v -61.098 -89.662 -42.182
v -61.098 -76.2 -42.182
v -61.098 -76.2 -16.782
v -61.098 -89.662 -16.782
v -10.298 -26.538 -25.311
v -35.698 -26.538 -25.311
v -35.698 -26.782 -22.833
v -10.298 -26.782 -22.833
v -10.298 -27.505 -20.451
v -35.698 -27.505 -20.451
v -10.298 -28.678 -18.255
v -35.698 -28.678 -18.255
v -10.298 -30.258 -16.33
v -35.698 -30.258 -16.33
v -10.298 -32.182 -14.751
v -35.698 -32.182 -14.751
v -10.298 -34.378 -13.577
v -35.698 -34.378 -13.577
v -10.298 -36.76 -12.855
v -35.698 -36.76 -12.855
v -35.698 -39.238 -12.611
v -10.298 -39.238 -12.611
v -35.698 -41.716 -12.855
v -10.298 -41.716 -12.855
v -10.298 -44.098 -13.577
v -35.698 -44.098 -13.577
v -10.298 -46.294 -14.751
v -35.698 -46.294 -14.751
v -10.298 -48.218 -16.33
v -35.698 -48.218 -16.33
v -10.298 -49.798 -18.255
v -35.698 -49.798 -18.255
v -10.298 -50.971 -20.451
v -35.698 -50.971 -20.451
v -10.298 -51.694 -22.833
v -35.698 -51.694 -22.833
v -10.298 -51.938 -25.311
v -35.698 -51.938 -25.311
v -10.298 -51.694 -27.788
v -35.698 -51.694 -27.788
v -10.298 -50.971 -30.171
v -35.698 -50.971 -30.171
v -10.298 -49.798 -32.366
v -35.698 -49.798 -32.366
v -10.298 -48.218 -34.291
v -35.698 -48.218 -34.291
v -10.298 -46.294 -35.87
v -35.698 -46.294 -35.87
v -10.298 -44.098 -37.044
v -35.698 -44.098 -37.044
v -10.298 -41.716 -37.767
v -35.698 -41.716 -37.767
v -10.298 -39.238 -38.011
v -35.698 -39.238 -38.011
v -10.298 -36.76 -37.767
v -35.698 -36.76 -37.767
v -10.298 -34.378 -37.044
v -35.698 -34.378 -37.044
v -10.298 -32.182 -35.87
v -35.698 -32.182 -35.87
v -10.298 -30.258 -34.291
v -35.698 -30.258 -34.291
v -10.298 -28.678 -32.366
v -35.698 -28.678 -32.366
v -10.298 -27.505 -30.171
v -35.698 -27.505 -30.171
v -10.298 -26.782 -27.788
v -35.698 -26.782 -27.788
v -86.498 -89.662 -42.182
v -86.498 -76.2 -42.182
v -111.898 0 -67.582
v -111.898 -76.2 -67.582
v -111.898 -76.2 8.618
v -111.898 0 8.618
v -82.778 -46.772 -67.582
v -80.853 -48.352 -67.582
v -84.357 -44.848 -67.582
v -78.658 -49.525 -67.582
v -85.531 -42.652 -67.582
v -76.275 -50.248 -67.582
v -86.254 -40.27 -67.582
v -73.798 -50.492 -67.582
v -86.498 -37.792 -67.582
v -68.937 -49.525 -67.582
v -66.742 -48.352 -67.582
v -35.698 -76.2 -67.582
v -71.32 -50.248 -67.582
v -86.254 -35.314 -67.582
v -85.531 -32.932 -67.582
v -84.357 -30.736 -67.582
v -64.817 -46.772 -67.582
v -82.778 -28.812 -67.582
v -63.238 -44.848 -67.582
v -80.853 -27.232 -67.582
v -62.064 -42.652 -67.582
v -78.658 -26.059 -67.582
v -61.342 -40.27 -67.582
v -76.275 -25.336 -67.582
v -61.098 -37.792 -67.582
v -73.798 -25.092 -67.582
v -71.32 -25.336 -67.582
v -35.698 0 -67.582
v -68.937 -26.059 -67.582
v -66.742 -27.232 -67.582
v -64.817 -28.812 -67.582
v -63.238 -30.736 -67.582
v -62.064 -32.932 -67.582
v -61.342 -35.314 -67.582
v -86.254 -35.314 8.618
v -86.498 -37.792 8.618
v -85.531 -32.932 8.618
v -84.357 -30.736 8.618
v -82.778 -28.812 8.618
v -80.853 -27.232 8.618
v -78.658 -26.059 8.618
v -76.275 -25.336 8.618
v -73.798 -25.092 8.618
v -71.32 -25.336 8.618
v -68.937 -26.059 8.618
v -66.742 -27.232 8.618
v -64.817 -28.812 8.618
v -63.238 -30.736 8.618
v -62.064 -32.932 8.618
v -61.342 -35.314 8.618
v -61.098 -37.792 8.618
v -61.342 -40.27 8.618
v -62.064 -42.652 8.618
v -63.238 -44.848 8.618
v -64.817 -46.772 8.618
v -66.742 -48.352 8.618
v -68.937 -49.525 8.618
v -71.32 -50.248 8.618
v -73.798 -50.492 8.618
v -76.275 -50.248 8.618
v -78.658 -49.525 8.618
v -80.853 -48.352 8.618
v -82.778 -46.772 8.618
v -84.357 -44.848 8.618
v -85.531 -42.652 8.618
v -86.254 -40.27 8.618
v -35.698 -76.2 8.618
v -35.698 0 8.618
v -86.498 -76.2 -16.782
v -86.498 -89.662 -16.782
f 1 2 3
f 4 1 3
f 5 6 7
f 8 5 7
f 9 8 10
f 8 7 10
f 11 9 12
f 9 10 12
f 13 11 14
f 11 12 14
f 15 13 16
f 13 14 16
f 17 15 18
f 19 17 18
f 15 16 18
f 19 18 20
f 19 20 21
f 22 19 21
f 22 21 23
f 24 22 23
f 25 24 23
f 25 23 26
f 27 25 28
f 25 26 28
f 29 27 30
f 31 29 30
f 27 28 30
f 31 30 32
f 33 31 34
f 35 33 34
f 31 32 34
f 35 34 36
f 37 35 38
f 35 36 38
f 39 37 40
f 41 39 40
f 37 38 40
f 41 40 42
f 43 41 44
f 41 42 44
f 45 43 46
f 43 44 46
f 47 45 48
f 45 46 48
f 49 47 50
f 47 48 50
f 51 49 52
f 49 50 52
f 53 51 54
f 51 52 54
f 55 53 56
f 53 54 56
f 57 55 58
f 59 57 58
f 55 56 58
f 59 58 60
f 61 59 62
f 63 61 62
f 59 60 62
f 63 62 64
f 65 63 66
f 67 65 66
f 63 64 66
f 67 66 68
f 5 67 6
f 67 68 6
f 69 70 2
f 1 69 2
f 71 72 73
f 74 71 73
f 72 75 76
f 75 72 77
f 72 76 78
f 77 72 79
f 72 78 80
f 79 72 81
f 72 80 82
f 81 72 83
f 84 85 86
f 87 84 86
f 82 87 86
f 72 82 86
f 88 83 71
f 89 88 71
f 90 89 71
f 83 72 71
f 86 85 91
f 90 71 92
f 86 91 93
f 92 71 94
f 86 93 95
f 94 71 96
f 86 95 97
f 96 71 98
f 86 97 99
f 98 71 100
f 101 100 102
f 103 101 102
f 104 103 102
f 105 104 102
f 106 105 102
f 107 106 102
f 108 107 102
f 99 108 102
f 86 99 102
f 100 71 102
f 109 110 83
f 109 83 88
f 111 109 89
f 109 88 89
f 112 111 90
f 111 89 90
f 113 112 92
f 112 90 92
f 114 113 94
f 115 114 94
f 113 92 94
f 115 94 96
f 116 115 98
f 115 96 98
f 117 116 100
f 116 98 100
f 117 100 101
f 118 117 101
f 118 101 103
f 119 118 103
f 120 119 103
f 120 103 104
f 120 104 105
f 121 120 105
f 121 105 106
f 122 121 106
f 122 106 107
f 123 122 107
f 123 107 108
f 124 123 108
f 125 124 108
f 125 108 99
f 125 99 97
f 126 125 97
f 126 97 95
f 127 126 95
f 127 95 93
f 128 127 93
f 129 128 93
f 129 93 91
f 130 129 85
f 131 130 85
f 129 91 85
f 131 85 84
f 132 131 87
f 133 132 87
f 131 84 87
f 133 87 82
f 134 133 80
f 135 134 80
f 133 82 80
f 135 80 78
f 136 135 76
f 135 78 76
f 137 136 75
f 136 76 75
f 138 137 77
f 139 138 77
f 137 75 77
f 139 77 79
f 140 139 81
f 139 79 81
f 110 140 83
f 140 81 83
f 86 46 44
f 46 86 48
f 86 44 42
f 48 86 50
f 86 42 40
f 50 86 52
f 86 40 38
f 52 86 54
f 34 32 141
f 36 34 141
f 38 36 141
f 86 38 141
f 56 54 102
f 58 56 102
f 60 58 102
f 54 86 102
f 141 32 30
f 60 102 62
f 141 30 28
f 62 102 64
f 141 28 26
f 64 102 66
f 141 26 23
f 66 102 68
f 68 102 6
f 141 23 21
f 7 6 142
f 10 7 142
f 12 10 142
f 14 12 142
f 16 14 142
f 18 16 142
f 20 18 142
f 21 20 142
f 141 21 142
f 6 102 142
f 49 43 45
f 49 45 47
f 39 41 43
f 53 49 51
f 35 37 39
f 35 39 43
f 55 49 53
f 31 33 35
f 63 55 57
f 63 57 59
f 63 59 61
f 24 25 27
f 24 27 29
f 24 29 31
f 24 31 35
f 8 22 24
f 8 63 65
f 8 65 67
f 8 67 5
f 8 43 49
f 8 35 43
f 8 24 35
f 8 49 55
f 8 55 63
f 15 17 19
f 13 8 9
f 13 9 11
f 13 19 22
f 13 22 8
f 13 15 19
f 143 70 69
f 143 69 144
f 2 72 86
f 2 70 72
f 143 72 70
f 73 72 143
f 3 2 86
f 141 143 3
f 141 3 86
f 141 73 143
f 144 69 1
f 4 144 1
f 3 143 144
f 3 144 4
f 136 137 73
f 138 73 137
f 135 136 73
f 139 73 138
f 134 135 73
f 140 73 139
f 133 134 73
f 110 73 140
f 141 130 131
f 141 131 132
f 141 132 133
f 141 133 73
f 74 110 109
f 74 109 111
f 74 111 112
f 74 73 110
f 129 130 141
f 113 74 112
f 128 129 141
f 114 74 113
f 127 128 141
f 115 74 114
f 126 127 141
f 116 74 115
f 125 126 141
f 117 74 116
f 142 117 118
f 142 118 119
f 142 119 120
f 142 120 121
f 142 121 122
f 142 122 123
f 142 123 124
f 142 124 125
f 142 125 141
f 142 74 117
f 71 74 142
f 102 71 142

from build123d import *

# Parameters (mm, degrees)
F0_W     = 76.2
F0_H     = 76.2
F1_DEPTH = 76.2
F3_D     = 25.4
F4_W     = 25.4
F4_H     = 25.4
F5_DEPTH = 13.462
F6_R     = 12.7
F7_DEPTH = 25.4
F8_DEPTH = 25.4


with BuildPart() as f1:
    # F0 (on Front) → F1 (new body)
    with BuildSketch(Plane.XZ):
        with Locations((-73.797528, -29.481855)):
            Rectangle(F0_W, F0_H)
    extrude(amount=F1_DEPTH)

    # F3 (through all)
    with Locations(Plane.XY.offset(8.618145)):
        with Locations((-73.797528, -37.791912)):
            Hole(F3_D / 2)

    # F4 (on face) → F5 (join)
    with BuildSketch(Plane.XZ.offset(76.2)):
        with Locations((-73.797528, -29.481855)):
            Rectangle(F4_W, F4_H)
    extrude(amount=F5_DEPTH)

    # F6 (on face) → F7 (join)
    with BuildSketch(Plane.YZ.offset(-35.697528)):
        with Locations((-39.237883, -25.310718)):
            Circle(F6_R)
    extrude(amount=F7_DEPTH)

    # F6 (on face) → F8 (join)
    with BuildSketch(Plane.YZ.offset(-35.697528)):
        with Locations((-39.237883, -25.310718)):
            Circle(F6_R)
    extrude(amount=F8_DEPTH)


solid = f1.part
